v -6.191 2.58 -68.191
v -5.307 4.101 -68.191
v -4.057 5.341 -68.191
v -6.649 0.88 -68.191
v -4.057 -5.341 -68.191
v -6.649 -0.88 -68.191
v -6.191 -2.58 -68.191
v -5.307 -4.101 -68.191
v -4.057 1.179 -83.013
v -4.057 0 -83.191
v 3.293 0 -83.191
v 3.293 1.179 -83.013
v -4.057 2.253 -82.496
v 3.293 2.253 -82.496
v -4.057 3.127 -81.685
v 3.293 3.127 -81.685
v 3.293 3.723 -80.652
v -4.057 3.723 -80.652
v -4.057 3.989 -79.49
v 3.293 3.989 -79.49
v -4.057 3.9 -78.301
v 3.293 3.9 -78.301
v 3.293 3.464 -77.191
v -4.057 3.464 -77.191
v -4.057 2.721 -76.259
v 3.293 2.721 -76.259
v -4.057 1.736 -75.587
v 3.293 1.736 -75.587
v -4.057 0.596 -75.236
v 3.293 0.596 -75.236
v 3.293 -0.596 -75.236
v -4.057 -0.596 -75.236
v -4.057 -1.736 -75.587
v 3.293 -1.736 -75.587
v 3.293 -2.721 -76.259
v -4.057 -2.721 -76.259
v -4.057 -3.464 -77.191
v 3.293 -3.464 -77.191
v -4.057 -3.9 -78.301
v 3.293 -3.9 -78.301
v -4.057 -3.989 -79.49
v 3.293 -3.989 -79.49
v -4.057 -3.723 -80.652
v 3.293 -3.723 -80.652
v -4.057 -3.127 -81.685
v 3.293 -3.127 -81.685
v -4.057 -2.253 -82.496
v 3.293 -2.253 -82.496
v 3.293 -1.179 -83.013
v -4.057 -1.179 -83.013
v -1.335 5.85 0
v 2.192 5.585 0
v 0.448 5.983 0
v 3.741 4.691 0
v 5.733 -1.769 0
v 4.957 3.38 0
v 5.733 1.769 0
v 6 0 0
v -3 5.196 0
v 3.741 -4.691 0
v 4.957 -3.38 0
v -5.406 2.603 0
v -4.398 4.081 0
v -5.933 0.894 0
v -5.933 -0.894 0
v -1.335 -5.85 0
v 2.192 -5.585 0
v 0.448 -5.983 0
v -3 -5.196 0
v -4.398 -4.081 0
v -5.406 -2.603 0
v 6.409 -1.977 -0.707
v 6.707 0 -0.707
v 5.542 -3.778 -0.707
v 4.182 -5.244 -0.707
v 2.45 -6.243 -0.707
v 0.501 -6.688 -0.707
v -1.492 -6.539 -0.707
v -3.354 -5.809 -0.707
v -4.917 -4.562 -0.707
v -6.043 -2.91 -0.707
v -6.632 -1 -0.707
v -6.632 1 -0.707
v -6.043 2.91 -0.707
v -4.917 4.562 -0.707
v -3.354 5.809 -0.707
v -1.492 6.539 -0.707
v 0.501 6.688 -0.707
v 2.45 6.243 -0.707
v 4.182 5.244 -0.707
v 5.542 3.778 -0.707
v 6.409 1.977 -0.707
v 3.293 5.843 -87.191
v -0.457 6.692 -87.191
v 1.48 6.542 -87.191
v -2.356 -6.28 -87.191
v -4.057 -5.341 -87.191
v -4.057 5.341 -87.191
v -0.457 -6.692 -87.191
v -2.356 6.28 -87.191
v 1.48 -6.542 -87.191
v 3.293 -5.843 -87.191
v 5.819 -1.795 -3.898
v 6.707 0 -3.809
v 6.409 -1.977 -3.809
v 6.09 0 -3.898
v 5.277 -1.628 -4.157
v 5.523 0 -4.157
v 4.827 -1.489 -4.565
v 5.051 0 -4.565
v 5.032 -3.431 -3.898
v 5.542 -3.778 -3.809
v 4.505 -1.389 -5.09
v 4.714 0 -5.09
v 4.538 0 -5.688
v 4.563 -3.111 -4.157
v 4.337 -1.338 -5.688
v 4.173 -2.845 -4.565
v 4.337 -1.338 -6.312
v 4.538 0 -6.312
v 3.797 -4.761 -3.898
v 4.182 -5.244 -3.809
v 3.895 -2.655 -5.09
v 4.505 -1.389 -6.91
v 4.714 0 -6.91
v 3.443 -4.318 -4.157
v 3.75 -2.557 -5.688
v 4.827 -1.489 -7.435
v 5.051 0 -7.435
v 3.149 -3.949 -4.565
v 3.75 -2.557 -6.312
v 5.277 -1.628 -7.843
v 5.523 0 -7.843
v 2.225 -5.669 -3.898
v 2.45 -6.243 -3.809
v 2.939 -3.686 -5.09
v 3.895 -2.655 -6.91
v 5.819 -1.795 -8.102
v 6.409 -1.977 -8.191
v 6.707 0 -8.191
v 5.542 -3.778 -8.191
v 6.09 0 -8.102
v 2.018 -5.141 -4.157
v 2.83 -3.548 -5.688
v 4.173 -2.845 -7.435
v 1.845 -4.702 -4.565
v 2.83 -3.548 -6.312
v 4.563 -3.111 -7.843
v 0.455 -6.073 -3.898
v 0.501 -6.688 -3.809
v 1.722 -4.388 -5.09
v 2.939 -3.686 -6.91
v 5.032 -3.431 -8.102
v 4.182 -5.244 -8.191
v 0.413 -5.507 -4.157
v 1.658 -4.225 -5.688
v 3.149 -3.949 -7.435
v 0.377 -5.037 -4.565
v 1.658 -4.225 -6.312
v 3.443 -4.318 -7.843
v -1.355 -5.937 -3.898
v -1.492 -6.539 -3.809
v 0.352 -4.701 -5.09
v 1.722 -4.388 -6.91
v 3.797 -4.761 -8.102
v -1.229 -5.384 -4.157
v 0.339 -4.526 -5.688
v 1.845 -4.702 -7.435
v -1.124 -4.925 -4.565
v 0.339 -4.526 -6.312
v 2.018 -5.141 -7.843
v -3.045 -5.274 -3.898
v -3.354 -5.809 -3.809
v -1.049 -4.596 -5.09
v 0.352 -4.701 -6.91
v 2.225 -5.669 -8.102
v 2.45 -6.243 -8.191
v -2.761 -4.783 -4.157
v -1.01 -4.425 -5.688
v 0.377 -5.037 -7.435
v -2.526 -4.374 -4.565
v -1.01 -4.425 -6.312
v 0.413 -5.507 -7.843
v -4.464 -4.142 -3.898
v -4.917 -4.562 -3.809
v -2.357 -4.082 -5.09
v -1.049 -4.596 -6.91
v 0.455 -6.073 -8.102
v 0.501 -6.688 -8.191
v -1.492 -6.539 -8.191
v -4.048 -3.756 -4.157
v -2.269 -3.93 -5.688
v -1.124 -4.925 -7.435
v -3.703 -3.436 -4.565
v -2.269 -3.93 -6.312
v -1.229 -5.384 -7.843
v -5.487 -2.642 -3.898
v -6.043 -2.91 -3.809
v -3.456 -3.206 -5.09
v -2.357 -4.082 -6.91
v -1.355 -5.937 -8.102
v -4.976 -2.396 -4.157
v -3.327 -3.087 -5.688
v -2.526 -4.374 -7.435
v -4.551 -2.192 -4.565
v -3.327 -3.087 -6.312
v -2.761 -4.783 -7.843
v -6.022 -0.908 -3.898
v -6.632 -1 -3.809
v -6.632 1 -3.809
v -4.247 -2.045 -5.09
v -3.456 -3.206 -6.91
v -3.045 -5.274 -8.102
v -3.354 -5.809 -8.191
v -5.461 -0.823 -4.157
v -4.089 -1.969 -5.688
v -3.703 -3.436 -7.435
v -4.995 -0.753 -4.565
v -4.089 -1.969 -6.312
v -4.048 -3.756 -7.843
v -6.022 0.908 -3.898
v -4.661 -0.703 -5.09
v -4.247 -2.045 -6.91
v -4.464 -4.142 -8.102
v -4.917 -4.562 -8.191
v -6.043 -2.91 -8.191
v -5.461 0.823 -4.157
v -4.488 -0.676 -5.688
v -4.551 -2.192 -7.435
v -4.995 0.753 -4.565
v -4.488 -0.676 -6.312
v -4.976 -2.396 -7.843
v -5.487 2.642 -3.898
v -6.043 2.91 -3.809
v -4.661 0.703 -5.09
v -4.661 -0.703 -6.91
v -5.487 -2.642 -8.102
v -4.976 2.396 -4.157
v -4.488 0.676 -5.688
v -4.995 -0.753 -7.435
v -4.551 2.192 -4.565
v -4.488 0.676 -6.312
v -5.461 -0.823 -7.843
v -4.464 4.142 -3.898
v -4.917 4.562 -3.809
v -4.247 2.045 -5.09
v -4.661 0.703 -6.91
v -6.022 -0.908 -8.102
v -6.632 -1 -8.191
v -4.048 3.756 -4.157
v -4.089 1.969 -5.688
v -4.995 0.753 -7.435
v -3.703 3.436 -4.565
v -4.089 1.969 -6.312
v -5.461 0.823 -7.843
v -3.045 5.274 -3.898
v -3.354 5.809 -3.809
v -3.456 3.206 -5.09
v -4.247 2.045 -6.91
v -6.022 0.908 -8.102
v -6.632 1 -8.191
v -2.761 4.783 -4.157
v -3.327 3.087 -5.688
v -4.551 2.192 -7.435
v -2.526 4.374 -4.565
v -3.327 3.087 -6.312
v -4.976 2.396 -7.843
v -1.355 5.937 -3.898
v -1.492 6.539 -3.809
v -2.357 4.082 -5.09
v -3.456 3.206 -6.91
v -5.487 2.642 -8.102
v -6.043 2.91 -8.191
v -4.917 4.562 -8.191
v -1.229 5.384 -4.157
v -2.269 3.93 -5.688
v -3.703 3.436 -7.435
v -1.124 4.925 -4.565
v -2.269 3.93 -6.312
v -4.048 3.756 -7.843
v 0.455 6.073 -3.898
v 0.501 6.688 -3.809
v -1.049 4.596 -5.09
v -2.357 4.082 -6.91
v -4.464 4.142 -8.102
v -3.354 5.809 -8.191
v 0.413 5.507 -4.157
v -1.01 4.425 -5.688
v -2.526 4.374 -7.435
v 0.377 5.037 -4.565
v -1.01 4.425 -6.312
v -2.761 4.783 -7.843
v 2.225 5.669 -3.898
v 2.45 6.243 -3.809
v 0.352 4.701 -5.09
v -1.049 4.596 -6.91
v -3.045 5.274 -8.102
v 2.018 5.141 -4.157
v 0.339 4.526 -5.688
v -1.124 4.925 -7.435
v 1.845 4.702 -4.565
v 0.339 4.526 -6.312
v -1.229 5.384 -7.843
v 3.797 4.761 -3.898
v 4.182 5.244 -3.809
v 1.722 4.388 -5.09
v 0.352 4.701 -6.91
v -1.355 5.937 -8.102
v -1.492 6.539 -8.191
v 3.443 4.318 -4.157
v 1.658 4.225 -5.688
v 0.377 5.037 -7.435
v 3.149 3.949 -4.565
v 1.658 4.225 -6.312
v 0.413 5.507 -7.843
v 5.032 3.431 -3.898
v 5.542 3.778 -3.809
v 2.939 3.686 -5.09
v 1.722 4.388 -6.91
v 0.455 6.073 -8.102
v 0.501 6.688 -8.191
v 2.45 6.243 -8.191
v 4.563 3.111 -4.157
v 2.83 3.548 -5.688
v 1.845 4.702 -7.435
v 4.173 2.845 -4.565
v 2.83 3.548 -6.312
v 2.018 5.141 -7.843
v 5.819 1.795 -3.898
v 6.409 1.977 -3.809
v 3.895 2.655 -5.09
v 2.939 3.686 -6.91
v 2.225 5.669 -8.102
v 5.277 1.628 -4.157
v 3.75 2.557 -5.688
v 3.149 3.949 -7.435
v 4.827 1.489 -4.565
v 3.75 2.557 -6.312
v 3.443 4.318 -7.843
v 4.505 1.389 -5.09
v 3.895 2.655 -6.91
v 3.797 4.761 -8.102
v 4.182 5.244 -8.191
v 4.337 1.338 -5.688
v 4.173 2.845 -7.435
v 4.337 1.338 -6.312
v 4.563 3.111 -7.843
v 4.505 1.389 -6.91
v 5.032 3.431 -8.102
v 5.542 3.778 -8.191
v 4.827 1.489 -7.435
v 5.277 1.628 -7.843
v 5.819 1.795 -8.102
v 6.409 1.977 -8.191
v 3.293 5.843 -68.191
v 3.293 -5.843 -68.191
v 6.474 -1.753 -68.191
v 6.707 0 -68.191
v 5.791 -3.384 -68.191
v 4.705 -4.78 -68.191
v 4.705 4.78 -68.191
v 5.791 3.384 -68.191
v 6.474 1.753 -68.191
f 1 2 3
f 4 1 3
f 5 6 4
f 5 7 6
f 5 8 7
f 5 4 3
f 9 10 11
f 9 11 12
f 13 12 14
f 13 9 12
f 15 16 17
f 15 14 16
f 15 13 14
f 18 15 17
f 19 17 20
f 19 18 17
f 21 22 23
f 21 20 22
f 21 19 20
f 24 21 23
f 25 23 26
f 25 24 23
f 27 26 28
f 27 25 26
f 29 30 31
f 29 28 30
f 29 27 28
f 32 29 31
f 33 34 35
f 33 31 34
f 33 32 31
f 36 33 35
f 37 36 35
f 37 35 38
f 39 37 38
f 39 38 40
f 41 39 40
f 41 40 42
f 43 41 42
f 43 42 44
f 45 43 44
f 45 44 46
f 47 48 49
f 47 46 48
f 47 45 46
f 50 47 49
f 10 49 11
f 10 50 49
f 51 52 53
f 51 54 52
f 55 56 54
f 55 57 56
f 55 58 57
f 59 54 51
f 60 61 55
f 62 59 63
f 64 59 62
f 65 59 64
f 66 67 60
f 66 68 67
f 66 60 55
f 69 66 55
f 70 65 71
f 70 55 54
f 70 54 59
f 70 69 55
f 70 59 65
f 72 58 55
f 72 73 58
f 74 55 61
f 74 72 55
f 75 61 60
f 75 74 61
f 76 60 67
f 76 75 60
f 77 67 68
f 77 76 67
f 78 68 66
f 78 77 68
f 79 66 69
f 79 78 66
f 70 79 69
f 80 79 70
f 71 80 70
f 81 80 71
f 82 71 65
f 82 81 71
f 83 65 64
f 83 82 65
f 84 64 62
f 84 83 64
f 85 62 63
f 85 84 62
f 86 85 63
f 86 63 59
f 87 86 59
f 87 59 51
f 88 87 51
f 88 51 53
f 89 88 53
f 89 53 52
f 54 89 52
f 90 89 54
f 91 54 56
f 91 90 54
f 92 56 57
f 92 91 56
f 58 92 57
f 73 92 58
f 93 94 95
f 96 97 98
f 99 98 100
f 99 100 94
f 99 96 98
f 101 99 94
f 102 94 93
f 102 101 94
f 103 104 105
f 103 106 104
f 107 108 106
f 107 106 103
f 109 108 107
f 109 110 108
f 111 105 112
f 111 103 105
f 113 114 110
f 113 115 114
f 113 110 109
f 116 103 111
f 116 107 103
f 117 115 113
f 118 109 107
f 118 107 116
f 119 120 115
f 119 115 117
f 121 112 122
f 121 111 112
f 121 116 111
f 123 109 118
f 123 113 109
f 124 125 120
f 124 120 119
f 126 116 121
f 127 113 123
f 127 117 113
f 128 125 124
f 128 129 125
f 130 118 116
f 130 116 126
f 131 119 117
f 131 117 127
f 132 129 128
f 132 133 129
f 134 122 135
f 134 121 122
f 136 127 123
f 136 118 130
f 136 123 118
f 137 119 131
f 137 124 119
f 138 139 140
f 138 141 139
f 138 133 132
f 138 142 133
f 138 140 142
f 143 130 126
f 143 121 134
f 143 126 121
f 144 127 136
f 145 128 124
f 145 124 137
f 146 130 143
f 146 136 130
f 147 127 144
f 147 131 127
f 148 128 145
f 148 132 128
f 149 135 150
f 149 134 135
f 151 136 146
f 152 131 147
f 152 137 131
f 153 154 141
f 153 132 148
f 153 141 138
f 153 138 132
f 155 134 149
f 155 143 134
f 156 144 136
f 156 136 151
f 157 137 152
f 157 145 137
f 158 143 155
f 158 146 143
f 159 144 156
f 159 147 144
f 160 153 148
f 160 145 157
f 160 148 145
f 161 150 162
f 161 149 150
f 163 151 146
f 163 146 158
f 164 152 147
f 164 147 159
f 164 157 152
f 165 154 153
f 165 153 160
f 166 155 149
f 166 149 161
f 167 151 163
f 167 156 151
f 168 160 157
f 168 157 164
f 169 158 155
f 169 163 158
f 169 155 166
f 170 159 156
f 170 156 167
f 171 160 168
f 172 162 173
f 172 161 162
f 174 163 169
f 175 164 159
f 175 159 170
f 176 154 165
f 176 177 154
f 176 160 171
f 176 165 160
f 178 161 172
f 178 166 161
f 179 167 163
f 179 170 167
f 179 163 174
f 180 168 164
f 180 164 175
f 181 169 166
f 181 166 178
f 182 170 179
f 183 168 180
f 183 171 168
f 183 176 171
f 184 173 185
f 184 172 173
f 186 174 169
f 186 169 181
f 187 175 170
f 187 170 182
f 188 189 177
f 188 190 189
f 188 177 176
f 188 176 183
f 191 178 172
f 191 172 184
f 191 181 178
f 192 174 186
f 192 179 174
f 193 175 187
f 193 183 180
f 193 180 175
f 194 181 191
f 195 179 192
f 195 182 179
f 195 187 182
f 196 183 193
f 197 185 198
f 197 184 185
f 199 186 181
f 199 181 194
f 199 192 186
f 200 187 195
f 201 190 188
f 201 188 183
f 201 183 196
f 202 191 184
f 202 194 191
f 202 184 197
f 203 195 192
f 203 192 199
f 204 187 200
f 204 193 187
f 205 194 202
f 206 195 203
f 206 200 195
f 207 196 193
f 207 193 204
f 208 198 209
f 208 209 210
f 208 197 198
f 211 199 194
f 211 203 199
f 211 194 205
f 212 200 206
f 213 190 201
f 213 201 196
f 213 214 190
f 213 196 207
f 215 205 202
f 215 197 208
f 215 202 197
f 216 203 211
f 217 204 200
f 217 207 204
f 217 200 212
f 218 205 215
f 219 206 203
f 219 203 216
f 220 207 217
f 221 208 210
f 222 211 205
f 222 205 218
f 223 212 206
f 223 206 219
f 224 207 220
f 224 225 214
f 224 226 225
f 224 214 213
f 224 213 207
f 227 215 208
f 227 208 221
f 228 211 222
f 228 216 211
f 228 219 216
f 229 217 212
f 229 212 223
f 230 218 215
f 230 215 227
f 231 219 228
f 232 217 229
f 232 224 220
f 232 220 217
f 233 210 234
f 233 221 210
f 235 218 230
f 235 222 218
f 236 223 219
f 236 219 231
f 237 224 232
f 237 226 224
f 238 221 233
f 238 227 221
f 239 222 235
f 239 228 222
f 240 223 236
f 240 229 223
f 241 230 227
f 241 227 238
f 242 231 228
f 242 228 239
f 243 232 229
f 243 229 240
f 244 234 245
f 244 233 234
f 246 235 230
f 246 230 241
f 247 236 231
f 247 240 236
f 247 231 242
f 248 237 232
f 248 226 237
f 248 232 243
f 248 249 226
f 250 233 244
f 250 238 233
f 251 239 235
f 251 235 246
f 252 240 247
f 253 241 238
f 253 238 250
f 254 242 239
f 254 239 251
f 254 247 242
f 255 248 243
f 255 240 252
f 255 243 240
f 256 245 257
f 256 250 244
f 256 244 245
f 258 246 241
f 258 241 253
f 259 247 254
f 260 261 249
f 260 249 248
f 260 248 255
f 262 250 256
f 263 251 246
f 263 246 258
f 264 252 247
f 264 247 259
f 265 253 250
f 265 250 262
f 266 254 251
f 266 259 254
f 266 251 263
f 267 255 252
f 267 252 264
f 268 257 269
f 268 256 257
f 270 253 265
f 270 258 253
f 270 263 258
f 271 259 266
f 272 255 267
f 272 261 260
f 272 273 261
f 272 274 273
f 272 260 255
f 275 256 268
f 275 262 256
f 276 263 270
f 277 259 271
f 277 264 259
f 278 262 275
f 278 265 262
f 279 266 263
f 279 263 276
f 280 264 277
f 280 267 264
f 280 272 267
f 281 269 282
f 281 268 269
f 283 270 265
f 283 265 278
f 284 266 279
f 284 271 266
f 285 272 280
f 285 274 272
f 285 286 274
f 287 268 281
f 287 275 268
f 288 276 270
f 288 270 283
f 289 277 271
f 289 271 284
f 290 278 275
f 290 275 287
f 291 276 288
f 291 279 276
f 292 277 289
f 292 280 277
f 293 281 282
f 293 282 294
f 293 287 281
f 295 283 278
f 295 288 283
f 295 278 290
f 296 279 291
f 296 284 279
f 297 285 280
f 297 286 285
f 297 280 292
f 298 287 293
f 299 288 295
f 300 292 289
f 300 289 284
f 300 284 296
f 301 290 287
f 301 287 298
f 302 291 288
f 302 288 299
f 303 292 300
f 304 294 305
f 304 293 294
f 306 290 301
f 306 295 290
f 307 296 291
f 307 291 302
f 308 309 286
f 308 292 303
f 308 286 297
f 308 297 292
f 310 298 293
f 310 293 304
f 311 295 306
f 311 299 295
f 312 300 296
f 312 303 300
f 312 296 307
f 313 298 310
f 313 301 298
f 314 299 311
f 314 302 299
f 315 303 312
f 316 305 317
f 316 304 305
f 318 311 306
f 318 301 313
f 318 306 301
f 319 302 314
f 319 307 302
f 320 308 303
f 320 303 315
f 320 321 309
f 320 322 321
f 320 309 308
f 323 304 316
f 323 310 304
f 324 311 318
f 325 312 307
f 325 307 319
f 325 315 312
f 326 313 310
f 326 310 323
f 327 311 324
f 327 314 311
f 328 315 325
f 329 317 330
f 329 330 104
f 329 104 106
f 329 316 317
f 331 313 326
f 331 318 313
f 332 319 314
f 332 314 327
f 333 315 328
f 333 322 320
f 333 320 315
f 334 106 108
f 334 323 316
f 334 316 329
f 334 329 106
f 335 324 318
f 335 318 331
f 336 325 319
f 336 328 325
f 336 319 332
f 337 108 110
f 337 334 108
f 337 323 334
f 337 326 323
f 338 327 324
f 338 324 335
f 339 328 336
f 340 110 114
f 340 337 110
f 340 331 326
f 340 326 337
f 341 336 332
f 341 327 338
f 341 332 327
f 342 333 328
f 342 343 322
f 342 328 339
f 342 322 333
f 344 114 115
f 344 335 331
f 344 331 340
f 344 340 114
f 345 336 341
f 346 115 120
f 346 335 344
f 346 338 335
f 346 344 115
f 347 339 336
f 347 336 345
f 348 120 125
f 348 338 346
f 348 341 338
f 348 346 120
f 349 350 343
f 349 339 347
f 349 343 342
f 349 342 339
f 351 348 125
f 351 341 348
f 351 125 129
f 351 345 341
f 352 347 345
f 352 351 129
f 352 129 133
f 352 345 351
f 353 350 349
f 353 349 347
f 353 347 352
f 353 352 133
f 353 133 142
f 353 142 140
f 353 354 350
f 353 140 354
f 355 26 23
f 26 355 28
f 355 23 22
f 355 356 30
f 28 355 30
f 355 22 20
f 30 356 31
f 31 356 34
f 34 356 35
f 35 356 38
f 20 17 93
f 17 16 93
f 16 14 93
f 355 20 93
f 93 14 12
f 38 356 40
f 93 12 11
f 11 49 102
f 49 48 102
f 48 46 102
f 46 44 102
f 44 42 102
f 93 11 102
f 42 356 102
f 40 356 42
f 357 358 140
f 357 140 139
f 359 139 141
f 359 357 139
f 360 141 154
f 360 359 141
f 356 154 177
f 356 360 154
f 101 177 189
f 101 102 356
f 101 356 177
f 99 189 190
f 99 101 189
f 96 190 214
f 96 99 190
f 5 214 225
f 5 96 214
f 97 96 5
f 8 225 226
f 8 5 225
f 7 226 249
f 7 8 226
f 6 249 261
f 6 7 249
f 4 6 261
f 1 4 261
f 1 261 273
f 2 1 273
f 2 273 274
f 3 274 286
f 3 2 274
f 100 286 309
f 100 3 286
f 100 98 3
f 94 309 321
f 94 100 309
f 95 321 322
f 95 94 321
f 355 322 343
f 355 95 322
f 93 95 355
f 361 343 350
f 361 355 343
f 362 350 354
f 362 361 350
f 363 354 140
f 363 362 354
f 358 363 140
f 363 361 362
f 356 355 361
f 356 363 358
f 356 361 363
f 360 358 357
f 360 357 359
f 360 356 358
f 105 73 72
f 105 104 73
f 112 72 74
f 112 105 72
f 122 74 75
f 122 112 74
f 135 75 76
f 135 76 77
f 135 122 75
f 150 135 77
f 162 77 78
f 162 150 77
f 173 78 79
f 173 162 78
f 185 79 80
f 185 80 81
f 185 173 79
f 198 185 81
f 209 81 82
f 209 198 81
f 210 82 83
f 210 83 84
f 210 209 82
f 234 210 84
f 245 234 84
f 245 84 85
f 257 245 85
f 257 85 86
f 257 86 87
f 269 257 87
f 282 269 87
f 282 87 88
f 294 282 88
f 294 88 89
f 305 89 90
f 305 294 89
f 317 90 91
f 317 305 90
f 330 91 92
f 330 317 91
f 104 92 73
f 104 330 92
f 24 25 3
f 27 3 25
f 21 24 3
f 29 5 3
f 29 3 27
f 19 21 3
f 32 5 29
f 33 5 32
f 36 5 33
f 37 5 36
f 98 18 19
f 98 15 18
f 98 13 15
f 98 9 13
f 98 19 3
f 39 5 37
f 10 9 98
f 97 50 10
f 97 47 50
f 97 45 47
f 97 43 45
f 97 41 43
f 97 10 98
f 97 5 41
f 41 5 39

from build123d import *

# Parameters (mm, degrees)
CORTE_EXTRUS_O1_DEPTH      = 88.705522097
CORTE_EXTRUS_O1_DEPTH_BACK = 88.705522097
ESBO_O2_W                  = 3.414213562
ESBO_O2_H                  = 19
ESBO_O2_W_2                = 2.65
CORTE_EXTRUS_O2_DEPTH      = 89.018596472
CORTE_EXTRUS_O2_DEPTH_BACK = 89.018596472
ESBO_O3_R                  = 4


with BuildPart() as part:
    # Esboço1 → Revolução1 (revolve)
    with BuildSketch(Plane(origin=(0, 0, 0), x_dir=(0, 0, -1), z_dir=(1, 0, 0)), mode=Mode.PRIVATE) as revolu_o1_sk:
        with BuildLine():
            Line((0, 0), (0, 6))
            Line((0, 6), (0.707106781, 6.707106781))
            Line((0.707106781, 6.707106781), (3.808899287, 6.707106781))
            ThreePointArc((3.808899287, 6.707106781), (6, 4.516006068), (8.191100713, 6.707106781))
            Line((8.191100713, 6.707106781), (87.191100713, 6.707106781))
            Line((87.191100713, 6.707106781), (87.191100713, 0))
            Line((87.191100713, 0), (0, 0))
        make_face()
    revolve(revolu_o1_sk.sketch.rotate(Axis((0, 0, 0), (0, 0, -1)), 90), axis=Axis((0, 0, 0), (0, 0, -1)))

    # Esboço2 → Corte-extrusão1 (cut, two sides: drawn at the far end of the back side and taken through both)
    with BuildSketch(Plane(origin=(0, 0, 0), x_dir=(1, 0, 0), z_dir=(0, 1, 0)).offset(-CORTE_EXTRUS_O1_DEPTH_BACK)):
        with Locations((5, 77.691100713)):
            Rectangle(ESBO_O2_W, ESBO_O2_H)
        with Locations((-5.382106781, 77.691100713)):
            Rectangle(ESBO_O2_W_2, ESBO_O2_H)
    extrude(amount=CORTE_EXTRUS_O1_DEPTH + CORTE_EXTRUS_O1_DEPTH_BACK, mode=Mode.SUBTRACT)

    # Esboço3 → Corte-extrusão2 (cut, two sides: drawn at the far end of the back side and taken through both)
    with BuildSketch(Plane(origin=(3.292893219, 0, 0), x_dir=(0, 0, -1), z_dir=(1, 0, 0)).offset(-CORTE_EXTRUS_O2_DEPTH_BACK)):
        with Locations((79.191100713, 0)):
            Circle(ESBO_O3_R)
    extrude(amount=CORTE_EXTRUS_O2_DEPTH + CORTE_EXTRUS_O2_DEPTH_BACK, mode=Mode.SUBTRACT)


solid = part.part
